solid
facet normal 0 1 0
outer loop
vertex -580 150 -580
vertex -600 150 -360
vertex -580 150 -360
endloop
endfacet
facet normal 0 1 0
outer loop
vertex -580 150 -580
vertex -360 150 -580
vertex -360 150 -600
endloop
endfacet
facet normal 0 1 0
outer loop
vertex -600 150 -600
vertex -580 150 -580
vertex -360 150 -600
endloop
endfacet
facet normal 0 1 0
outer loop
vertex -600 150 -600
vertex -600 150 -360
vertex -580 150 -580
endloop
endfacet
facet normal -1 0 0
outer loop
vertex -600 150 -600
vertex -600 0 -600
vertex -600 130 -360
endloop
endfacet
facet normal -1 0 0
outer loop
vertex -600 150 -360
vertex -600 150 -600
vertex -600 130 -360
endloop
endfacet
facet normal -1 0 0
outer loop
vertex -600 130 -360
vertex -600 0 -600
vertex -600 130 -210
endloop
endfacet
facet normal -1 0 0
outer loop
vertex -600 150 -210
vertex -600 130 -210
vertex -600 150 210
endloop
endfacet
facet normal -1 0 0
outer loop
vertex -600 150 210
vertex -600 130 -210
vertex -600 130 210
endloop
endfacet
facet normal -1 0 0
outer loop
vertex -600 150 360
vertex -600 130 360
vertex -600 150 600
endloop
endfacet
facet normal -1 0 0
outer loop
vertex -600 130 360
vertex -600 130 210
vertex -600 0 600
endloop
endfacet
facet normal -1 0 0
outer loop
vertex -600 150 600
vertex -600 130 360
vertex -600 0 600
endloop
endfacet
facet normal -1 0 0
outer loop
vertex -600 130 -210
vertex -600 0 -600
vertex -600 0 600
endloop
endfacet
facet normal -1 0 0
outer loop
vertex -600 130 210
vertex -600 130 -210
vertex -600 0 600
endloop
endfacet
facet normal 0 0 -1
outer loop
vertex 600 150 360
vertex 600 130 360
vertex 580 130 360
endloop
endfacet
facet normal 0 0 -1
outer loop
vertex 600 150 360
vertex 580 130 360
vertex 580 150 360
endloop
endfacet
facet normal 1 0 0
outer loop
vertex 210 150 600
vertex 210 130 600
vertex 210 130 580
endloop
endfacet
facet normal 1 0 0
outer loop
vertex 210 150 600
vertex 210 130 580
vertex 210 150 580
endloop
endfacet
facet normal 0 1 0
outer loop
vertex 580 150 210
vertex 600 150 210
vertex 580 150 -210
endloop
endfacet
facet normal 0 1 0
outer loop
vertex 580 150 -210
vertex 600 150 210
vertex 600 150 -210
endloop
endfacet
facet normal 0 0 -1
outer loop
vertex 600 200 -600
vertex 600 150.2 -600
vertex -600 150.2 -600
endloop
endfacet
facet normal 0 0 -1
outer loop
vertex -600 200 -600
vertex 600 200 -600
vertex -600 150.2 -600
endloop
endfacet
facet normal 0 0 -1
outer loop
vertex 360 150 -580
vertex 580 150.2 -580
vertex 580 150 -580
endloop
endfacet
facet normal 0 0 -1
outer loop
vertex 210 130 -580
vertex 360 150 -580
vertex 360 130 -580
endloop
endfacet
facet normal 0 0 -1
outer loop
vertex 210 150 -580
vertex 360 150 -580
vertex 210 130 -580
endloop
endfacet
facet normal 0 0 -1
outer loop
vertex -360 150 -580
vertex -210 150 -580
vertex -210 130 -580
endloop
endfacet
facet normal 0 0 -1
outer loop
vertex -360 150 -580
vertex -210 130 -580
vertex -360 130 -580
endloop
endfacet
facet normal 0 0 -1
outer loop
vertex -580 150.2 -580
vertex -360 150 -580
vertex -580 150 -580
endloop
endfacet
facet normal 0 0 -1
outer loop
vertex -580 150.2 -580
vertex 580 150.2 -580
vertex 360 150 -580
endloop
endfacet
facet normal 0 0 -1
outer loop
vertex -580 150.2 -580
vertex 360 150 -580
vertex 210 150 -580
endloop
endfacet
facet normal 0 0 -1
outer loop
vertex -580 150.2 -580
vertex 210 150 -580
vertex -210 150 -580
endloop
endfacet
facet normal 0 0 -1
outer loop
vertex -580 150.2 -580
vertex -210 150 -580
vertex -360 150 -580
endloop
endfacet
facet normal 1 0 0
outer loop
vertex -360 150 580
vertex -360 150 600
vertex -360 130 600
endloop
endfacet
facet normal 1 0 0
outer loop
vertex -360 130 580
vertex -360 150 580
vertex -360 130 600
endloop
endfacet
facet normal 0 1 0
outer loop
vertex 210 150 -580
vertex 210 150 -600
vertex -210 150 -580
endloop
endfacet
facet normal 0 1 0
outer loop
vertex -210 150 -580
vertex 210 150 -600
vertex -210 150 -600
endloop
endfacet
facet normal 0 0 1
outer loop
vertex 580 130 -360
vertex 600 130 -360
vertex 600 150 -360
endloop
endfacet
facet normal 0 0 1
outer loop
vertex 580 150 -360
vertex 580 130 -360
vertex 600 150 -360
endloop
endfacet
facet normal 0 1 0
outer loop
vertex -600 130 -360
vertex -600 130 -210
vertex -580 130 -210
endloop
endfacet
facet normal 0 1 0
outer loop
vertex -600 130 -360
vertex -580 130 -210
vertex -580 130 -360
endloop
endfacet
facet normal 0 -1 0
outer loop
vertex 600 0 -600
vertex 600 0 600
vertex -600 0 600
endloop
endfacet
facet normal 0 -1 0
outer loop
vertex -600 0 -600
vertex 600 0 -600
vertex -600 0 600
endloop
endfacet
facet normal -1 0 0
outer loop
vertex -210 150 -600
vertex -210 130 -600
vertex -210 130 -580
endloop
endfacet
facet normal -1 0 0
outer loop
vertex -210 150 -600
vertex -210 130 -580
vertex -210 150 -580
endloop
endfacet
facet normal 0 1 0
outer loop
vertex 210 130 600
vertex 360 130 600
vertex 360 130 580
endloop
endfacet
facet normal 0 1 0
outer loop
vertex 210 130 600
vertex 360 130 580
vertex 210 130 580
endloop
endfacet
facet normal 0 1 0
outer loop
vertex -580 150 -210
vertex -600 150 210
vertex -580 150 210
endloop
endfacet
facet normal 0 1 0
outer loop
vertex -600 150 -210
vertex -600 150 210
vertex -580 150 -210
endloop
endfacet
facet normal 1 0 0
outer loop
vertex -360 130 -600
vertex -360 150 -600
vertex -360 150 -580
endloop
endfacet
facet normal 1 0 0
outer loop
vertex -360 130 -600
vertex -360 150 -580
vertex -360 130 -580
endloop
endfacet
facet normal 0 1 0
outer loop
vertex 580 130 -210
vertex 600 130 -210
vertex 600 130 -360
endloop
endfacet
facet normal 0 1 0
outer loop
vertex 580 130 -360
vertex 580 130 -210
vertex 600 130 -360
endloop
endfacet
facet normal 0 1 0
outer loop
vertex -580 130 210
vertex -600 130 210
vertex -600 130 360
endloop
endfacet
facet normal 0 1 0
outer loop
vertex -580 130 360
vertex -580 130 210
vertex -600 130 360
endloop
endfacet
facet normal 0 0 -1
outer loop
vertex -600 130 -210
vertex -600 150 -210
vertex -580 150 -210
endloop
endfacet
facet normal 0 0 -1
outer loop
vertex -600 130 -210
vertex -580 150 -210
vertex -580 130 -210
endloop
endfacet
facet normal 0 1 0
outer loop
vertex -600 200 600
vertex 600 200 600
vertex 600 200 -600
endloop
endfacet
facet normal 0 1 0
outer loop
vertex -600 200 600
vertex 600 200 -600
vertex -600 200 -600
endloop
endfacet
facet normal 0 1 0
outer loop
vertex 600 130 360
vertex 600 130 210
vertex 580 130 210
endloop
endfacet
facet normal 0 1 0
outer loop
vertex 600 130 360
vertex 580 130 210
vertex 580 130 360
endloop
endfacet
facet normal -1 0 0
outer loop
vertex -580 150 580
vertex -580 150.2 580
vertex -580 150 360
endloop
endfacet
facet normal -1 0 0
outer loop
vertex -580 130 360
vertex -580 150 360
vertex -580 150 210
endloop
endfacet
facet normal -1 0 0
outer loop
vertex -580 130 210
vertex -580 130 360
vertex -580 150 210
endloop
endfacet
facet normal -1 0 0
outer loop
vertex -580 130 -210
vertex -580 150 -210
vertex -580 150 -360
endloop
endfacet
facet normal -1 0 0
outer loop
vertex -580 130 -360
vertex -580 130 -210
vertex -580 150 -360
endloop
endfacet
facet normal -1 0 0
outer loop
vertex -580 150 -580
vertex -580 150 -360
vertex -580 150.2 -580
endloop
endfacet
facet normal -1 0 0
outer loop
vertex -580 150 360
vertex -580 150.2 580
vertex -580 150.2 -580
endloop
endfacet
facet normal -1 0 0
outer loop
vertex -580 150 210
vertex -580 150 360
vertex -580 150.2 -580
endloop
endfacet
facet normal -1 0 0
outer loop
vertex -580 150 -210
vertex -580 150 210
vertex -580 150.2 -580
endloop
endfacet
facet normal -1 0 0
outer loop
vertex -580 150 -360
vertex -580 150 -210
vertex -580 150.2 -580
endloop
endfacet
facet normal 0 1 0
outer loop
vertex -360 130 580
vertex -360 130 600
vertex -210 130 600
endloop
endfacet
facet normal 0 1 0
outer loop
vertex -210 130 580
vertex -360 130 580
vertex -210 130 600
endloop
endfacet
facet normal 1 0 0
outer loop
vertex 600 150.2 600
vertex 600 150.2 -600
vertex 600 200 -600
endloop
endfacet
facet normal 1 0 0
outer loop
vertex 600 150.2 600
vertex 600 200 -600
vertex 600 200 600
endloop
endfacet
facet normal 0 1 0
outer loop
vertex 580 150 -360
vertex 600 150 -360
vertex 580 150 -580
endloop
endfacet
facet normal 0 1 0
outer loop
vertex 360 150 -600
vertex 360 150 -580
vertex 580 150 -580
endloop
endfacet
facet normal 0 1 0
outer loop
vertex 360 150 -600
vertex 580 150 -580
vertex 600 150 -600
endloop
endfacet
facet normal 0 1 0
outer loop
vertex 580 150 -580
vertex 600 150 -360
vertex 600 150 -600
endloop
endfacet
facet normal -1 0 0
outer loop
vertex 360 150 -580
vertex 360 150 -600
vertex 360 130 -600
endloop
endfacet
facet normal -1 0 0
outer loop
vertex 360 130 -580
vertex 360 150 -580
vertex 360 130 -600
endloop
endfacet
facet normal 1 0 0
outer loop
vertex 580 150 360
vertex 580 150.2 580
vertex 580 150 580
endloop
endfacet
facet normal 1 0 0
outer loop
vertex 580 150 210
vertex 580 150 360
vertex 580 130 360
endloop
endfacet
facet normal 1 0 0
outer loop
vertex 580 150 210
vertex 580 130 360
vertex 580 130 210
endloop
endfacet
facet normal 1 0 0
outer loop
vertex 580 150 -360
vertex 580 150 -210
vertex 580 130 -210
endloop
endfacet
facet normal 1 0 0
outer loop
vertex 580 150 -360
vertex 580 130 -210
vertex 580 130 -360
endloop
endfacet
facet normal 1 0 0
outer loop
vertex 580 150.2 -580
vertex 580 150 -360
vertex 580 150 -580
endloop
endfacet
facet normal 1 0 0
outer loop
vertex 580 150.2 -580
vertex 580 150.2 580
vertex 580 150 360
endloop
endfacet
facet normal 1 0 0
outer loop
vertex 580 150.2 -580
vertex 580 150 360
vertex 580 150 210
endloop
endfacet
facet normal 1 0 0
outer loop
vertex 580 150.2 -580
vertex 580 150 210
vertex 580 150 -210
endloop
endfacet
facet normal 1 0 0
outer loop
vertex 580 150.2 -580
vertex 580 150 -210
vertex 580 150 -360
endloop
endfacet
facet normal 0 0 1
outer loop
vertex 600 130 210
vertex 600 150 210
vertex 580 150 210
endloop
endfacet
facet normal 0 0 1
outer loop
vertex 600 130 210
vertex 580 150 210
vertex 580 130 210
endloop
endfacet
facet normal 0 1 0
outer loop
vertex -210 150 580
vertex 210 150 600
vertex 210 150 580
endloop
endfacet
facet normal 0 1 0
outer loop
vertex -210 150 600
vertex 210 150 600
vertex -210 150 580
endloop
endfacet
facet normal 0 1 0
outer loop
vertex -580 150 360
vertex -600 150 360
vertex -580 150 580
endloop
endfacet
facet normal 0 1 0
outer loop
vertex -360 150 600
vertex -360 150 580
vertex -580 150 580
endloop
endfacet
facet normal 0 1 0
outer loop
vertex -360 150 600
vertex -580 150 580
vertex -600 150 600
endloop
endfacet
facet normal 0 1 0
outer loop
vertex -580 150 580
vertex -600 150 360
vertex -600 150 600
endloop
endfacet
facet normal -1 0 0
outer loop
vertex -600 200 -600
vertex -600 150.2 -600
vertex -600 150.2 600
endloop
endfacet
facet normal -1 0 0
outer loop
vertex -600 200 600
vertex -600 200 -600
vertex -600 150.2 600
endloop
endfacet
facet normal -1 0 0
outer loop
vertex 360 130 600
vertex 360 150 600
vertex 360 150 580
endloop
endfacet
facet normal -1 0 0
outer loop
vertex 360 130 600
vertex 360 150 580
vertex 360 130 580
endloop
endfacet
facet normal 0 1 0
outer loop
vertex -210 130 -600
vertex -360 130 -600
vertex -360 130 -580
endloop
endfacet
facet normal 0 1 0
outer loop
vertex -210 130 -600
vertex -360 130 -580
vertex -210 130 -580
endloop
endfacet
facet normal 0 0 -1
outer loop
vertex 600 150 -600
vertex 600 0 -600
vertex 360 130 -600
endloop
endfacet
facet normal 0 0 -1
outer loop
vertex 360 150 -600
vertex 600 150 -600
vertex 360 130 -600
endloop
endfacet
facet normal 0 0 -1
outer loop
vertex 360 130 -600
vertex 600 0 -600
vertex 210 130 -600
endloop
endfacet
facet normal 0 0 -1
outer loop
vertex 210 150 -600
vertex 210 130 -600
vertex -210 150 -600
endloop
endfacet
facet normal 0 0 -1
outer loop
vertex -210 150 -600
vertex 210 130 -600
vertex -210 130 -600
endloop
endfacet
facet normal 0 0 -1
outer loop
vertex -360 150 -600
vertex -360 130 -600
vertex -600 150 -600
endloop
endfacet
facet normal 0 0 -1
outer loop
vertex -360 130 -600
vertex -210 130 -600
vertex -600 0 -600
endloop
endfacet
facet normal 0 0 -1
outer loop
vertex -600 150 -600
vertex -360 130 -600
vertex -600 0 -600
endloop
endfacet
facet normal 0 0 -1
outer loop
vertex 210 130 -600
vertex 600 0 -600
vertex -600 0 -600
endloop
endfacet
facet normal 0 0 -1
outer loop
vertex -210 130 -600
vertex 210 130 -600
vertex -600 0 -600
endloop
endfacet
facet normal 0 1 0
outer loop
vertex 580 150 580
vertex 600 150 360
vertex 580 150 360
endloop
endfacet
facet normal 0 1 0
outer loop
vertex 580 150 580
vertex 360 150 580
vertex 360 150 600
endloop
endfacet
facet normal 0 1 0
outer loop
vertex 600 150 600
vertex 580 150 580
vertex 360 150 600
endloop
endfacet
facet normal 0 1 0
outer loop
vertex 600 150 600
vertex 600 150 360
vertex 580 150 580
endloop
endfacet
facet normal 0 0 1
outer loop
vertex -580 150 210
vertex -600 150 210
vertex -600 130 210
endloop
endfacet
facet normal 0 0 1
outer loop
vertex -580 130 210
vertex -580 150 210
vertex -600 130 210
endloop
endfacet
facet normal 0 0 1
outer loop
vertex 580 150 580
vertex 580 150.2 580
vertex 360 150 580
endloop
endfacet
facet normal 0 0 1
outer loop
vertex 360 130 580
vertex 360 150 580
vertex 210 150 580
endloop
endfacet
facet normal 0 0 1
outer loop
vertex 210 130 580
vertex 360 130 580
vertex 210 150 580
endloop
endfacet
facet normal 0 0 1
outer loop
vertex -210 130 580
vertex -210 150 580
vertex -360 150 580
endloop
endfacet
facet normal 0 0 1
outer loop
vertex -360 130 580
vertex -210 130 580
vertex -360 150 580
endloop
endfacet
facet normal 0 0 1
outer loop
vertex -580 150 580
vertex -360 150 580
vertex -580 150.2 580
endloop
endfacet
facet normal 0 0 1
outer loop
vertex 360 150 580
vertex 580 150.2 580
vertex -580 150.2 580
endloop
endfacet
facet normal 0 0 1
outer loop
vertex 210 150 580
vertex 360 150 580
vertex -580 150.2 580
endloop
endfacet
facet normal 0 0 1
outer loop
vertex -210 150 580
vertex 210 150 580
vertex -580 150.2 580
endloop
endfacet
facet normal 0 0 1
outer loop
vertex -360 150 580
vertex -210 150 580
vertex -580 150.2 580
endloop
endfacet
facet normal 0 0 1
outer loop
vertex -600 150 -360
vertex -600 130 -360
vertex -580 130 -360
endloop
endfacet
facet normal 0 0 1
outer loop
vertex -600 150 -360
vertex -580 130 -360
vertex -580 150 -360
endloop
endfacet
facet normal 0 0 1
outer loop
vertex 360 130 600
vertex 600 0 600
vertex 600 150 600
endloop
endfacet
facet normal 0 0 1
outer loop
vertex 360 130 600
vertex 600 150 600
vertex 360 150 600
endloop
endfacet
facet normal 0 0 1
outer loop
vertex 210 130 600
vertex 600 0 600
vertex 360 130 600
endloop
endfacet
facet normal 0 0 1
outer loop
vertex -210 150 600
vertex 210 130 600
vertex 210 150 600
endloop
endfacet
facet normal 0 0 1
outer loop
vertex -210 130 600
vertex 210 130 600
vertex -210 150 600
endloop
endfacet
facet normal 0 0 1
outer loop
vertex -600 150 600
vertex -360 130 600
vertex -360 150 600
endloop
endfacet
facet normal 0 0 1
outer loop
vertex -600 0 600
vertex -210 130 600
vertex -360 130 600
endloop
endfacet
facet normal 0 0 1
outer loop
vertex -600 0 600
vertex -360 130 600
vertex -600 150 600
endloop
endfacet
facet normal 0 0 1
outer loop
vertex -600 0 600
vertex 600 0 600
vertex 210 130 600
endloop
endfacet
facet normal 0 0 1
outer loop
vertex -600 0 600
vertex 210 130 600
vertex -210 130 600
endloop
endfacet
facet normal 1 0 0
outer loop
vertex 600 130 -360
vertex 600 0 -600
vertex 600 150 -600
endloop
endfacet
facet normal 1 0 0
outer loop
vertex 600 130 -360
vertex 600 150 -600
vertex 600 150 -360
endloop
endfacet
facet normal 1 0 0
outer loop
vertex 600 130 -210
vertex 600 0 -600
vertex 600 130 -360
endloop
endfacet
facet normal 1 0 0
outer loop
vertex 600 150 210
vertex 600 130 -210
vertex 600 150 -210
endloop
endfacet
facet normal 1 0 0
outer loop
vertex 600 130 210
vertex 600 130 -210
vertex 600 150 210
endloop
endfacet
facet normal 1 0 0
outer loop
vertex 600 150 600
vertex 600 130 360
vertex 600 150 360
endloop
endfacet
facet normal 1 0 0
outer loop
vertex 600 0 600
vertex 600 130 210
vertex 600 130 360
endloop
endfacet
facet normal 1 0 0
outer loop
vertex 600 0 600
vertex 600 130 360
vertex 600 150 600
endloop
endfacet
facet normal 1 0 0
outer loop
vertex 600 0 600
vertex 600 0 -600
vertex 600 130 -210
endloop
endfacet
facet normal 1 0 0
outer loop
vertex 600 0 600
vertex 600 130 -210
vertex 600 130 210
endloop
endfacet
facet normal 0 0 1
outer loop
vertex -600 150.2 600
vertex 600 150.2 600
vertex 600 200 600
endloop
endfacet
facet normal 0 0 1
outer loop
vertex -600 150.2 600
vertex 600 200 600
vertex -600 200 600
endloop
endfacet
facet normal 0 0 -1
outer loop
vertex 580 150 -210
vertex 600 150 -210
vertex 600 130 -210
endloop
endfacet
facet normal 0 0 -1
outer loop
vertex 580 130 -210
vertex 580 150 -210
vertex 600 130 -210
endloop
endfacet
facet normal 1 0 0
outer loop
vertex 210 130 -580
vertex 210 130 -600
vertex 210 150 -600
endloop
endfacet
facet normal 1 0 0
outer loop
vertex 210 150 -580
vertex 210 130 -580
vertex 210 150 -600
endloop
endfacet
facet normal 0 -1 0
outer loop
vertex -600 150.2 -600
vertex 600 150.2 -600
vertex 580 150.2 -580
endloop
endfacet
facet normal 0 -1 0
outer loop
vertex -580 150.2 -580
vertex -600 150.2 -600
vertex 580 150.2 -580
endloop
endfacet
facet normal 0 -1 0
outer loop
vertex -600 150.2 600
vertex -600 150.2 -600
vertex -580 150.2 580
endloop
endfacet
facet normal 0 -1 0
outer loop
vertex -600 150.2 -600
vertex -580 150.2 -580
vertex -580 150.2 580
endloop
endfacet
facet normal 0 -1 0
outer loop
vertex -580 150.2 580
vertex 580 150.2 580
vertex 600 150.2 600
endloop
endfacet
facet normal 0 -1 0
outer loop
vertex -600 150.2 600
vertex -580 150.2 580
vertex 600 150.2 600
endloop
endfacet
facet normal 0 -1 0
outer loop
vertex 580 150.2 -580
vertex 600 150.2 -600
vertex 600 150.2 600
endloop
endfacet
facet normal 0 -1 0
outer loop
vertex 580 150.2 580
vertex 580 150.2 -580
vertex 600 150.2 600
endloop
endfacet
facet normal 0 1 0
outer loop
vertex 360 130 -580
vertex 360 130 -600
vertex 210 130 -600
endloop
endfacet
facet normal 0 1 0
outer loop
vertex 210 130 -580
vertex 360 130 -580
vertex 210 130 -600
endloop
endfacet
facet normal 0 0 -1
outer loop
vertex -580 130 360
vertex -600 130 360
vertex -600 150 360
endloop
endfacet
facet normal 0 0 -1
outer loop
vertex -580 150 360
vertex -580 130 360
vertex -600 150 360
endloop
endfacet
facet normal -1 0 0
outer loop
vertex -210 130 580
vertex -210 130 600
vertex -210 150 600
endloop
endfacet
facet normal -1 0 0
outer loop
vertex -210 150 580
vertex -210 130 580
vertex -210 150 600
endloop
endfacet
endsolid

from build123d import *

# Parameters (mm, degrees)
SKETCH_1_W          = 600
SKETCH_1_H          = 600
EXTRUDE_1_DEPTH     = 200
CUT_EXTRUDE_1_DEPTH = 20
CUT_EXTRUDE_2_DEPTH = 20


with BuildPart() as part:
    # 草图1 → 凸台-拉伸1 (new body)
    with BuildSketch(Plane(origin=(0, 0, 0), x_dir=(1, 0, 0), z_dir=(0, 1, 0))):
        with Locations((-300, -300)):
            Rectangle(SKETCH_1_W, SKETCH_1_H)
    extrude(amount=EXTRUDE_1_DEPTH)

    # 草图2 → 切除-拉伸1 (cut)
    with BuildSketch(Plane.ZY.offset(600)):
        Polygon((600, 150.2), (0, 150.2), (0, 150), (210, 150), (210, 130), (360, 130), (360, 150), (600, 150), align=None)
    extrude(amount=-CUT_EXTRUDE_1_DEPTH, mode=Mode.SUBTRACT)

    # 草图3 → 切除-拉伸2 (cut)
    with BuildSketch(Plane.XY.offset(600)):
        Polygon((-580, 150.2), (-580, 150), (-360, 150), (-360, 130), (-210, 130), (-210, 150), (0, 150), (0, 150.2), align=None)
    extrude(amount=-CUT_EXTRUDE_2_DEPTH, mode=Mode.SUBTRACT)

    # 镜向1: part across plane


with BuildPart() as part_1:
    add(part.part)
    add(part.part.mirror(Plane(origin=(0, 200, 0), x_dir=(1, 0, 0), z_dir=(0, 0, 1))))

    # 镜向2: part across plane


with BuildPart() as part_2:
    add(part_1.part)
    add(part_1.part.mirror(Plane(origin=(0, 200, 0), x_dir=(0, 0, 1), z_dir=(-1, 0, 0))))


solid = part_2.part
